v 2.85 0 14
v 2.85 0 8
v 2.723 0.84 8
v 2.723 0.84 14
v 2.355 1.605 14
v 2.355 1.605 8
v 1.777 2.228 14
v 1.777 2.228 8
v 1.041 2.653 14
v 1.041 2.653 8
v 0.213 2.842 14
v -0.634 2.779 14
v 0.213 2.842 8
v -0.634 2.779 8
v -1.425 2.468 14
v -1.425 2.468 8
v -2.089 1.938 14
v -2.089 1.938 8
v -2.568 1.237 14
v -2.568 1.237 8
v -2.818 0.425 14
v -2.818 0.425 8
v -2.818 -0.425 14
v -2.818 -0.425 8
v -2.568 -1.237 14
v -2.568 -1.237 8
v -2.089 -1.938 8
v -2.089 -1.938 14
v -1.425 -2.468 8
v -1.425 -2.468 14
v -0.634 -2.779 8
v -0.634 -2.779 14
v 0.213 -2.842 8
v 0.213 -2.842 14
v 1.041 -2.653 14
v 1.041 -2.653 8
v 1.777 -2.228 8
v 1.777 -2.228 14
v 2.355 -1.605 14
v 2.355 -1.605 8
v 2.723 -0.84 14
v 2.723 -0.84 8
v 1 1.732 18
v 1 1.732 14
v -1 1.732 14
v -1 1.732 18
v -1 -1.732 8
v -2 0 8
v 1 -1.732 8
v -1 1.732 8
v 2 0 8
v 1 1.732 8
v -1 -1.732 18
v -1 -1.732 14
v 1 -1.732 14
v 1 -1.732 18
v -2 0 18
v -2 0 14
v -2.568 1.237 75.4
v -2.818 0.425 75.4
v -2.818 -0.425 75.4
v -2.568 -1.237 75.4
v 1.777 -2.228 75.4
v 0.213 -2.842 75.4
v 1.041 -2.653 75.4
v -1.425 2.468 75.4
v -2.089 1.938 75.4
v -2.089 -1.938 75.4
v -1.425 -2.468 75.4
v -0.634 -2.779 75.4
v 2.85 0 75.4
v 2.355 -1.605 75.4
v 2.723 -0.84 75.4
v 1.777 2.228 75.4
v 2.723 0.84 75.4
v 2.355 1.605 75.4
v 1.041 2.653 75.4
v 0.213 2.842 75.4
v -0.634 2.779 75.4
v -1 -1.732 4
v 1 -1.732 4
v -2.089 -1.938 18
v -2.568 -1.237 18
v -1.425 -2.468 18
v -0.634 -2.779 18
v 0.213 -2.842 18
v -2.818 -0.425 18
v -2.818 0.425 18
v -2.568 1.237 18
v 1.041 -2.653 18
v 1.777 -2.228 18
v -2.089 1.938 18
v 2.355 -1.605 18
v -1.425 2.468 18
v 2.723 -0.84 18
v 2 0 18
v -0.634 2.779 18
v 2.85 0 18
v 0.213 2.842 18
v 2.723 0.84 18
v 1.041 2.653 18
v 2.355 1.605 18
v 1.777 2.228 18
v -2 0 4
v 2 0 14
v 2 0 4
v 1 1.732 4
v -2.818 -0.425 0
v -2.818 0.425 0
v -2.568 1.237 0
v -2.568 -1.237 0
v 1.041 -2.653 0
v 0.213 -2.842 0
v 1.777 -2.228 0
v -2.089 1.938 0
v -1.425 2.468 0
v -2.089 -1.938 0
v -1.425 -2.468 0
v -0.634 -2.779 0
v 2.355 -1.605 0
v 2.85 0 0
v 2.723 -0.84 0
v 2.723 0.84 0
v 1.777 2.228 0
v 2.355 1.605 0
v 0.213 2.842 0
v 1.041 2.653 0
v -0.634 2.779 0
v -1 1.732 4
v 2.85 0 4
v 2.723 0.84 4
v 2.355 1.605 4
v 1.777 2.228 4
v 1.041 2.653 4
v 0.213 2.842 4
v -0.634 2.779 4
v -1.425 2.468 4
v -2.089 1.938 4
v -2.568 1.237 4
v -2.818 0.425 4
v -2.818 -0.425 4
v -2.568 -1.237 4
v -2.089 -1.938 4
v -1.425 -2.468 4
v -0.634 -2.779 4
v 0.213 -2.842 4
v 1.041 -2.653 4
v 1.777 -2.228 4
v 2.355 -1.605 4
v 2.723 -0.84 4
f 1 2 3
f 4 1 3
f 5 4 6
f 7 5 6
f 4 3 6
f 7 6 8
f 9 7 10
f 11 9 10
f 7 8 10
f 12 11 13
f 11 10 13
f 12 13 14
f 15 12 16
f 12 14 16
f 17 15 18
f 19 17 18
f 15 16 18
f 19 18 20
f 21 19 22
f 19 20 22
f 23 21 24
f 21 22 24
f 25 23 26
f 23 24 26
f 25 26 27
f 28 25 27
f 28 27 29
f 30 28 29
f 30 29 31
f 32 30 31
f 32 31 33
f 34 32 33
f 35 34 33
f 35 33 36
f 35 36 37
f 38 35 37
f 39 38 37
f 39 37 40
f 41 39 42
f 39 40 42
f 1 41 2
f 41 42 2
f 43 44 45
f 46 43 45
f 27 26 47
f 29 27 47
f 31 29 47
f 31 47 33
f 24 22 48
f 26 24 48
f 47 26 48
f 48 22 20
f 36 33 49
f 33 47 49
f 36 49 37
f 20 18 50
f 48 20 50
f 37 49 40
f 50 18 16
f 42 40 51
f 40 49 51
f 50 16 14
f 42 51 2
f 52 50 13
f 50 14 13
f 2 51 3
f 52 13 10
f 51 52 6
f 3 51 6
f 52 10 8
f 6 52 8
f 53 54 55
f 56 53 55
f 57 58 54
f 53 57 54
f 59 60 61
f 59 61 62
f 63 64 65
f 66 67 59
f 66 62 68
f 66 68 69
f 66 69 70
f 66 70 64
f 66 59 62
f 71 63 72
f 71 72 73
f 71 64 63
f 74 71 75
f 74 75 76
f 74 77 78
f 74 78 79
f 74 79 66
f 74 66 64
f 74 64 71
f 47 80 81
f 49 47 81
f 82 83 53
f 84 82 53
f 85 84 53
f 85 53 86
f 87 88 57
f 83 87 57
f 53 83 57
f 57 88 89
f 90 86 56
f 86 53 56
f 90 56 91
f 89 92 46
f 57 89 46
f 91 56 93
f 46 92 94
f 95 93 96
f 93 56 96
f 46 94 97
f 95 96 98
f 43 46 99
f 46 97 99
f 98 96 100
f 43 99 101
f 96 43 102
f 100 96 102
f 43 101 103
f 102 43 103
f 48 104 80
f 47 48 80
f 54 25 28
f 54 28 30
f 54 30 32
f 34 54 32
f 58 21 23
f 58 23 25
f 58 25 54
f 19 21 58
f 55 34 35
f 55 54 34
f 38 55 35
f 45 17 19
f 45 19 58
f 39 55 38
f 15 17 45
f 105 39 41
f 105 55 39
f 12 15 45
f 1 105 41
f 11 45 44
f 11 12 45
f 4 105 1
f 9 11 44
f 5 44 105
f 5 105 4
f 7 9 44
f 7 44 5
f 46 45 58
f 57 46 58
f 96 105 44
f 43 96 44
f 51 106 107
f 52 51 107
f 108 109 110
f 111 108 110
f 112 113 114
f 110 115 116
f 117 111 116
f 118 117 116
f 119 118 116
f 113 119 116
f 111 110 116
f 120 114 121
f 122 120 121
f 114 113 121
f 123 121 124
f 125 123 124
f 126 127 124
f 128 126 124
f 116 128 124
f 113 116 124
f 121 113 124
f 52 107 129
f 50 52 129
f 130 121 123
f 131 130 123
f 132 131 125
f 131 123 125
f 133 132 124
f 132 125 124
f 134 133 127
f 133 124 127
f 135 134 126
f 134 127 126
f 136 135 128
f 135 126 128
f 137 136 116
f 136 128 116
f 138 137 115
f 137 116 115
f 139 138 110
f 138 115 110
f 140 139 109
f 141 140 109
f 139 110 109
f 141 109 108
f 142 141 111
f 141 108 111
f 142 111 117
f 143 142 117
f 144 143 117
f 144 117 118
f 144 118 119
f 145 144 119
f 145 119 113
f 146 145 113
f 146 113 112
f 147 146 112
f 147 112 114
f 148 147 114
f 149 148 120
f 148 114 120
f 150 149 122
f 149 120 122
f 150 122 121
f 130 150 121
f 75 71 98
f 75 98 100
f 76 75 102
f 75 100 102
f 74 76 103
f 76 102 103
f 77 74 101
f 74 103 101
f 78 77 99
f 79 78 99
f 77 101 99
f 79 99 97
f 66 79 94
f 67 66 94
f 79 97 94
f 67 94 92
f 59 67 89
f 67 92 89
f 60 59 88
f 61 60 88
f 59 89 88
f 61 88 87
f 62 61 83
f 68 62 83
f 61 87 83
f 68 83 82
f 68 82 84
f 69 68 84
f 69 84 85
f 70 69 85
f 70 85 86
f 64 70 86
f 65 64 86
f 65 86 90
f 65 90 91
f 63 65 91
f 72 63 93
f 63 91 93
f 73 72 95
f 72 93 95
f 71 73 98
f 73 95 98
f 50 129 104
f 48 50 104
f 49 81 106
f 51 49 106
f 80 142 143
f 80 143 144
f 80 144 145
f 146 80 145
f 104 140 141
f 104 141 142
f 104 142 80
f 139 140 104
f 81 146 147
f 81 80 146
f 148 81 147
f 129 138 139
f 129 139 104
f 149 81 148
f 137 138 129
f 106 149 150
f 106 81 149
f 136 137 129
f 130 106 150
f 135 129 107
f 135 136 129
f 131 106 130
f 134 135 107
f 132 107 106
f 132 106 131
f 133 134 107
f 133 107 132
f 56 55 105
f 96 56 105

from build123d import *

# Parameters (mm, degrees)
SKETCH_1_R      = 2.85
EXTRUDE_1_DEPTH = 4
EXTRUDE_2_DEPTH = 4
SKETCH_3_R      = 2.85
EXTRUDE_3_DEPTH = 6
EXTRUDE_4_DEPTH = 4
SKETCH_6_R      = 2.85
EXTRUDE_5_DEPTH = 57.4


with BuildPart() as part:
    # 草图1 → 凸台-拉伸1 (new body)
    with BuildSketch(Plane.XY):
        Circle(SKETCH_1_R)
    extrude(amount=EXTRUDE_1_DEPTH)

    # 草图2 → 凸台-拉伸2 (add)
    with BuildSketch(Plane.XY.offset(4)):
        Polygon((2, 0), (1, 1.732050808), (-1, 1.732050808), (-2, 0), (-1, -1.732050808), (1, -1.732050808), align=None)
    extrude(amount=EXTRUDE_2_DEPTH)

    # 草图3 → 凸台-拉伸3 (add)
    with BuildSketch(Plane.XY.offset(8)):
        Circle(SKETCH_3_R)
    extrude(amount=EXTRUDE_3_DEPTH)

    # 草图4 → 凸台-拉伸4 (add)
    with BuildSketch(Plane.XY.offset(14)):
        Polygon((2, 0), (1, 1.732050808), (-1, 1.732050808), (-2, 0), (-1, -1.732050808), (1, -1.732050808), align=None)
    extrude(amount=EXTRUDE_4_DEPTH)

    # 草图6 → 凸台-拉伸5 (add)
    with BuildSketch(Plane.XY.offset(18)):
        Circle(SKETCH_6_R)
    extrude(amount=EXTRUDE_5_DEPTH)


solid = part.part
